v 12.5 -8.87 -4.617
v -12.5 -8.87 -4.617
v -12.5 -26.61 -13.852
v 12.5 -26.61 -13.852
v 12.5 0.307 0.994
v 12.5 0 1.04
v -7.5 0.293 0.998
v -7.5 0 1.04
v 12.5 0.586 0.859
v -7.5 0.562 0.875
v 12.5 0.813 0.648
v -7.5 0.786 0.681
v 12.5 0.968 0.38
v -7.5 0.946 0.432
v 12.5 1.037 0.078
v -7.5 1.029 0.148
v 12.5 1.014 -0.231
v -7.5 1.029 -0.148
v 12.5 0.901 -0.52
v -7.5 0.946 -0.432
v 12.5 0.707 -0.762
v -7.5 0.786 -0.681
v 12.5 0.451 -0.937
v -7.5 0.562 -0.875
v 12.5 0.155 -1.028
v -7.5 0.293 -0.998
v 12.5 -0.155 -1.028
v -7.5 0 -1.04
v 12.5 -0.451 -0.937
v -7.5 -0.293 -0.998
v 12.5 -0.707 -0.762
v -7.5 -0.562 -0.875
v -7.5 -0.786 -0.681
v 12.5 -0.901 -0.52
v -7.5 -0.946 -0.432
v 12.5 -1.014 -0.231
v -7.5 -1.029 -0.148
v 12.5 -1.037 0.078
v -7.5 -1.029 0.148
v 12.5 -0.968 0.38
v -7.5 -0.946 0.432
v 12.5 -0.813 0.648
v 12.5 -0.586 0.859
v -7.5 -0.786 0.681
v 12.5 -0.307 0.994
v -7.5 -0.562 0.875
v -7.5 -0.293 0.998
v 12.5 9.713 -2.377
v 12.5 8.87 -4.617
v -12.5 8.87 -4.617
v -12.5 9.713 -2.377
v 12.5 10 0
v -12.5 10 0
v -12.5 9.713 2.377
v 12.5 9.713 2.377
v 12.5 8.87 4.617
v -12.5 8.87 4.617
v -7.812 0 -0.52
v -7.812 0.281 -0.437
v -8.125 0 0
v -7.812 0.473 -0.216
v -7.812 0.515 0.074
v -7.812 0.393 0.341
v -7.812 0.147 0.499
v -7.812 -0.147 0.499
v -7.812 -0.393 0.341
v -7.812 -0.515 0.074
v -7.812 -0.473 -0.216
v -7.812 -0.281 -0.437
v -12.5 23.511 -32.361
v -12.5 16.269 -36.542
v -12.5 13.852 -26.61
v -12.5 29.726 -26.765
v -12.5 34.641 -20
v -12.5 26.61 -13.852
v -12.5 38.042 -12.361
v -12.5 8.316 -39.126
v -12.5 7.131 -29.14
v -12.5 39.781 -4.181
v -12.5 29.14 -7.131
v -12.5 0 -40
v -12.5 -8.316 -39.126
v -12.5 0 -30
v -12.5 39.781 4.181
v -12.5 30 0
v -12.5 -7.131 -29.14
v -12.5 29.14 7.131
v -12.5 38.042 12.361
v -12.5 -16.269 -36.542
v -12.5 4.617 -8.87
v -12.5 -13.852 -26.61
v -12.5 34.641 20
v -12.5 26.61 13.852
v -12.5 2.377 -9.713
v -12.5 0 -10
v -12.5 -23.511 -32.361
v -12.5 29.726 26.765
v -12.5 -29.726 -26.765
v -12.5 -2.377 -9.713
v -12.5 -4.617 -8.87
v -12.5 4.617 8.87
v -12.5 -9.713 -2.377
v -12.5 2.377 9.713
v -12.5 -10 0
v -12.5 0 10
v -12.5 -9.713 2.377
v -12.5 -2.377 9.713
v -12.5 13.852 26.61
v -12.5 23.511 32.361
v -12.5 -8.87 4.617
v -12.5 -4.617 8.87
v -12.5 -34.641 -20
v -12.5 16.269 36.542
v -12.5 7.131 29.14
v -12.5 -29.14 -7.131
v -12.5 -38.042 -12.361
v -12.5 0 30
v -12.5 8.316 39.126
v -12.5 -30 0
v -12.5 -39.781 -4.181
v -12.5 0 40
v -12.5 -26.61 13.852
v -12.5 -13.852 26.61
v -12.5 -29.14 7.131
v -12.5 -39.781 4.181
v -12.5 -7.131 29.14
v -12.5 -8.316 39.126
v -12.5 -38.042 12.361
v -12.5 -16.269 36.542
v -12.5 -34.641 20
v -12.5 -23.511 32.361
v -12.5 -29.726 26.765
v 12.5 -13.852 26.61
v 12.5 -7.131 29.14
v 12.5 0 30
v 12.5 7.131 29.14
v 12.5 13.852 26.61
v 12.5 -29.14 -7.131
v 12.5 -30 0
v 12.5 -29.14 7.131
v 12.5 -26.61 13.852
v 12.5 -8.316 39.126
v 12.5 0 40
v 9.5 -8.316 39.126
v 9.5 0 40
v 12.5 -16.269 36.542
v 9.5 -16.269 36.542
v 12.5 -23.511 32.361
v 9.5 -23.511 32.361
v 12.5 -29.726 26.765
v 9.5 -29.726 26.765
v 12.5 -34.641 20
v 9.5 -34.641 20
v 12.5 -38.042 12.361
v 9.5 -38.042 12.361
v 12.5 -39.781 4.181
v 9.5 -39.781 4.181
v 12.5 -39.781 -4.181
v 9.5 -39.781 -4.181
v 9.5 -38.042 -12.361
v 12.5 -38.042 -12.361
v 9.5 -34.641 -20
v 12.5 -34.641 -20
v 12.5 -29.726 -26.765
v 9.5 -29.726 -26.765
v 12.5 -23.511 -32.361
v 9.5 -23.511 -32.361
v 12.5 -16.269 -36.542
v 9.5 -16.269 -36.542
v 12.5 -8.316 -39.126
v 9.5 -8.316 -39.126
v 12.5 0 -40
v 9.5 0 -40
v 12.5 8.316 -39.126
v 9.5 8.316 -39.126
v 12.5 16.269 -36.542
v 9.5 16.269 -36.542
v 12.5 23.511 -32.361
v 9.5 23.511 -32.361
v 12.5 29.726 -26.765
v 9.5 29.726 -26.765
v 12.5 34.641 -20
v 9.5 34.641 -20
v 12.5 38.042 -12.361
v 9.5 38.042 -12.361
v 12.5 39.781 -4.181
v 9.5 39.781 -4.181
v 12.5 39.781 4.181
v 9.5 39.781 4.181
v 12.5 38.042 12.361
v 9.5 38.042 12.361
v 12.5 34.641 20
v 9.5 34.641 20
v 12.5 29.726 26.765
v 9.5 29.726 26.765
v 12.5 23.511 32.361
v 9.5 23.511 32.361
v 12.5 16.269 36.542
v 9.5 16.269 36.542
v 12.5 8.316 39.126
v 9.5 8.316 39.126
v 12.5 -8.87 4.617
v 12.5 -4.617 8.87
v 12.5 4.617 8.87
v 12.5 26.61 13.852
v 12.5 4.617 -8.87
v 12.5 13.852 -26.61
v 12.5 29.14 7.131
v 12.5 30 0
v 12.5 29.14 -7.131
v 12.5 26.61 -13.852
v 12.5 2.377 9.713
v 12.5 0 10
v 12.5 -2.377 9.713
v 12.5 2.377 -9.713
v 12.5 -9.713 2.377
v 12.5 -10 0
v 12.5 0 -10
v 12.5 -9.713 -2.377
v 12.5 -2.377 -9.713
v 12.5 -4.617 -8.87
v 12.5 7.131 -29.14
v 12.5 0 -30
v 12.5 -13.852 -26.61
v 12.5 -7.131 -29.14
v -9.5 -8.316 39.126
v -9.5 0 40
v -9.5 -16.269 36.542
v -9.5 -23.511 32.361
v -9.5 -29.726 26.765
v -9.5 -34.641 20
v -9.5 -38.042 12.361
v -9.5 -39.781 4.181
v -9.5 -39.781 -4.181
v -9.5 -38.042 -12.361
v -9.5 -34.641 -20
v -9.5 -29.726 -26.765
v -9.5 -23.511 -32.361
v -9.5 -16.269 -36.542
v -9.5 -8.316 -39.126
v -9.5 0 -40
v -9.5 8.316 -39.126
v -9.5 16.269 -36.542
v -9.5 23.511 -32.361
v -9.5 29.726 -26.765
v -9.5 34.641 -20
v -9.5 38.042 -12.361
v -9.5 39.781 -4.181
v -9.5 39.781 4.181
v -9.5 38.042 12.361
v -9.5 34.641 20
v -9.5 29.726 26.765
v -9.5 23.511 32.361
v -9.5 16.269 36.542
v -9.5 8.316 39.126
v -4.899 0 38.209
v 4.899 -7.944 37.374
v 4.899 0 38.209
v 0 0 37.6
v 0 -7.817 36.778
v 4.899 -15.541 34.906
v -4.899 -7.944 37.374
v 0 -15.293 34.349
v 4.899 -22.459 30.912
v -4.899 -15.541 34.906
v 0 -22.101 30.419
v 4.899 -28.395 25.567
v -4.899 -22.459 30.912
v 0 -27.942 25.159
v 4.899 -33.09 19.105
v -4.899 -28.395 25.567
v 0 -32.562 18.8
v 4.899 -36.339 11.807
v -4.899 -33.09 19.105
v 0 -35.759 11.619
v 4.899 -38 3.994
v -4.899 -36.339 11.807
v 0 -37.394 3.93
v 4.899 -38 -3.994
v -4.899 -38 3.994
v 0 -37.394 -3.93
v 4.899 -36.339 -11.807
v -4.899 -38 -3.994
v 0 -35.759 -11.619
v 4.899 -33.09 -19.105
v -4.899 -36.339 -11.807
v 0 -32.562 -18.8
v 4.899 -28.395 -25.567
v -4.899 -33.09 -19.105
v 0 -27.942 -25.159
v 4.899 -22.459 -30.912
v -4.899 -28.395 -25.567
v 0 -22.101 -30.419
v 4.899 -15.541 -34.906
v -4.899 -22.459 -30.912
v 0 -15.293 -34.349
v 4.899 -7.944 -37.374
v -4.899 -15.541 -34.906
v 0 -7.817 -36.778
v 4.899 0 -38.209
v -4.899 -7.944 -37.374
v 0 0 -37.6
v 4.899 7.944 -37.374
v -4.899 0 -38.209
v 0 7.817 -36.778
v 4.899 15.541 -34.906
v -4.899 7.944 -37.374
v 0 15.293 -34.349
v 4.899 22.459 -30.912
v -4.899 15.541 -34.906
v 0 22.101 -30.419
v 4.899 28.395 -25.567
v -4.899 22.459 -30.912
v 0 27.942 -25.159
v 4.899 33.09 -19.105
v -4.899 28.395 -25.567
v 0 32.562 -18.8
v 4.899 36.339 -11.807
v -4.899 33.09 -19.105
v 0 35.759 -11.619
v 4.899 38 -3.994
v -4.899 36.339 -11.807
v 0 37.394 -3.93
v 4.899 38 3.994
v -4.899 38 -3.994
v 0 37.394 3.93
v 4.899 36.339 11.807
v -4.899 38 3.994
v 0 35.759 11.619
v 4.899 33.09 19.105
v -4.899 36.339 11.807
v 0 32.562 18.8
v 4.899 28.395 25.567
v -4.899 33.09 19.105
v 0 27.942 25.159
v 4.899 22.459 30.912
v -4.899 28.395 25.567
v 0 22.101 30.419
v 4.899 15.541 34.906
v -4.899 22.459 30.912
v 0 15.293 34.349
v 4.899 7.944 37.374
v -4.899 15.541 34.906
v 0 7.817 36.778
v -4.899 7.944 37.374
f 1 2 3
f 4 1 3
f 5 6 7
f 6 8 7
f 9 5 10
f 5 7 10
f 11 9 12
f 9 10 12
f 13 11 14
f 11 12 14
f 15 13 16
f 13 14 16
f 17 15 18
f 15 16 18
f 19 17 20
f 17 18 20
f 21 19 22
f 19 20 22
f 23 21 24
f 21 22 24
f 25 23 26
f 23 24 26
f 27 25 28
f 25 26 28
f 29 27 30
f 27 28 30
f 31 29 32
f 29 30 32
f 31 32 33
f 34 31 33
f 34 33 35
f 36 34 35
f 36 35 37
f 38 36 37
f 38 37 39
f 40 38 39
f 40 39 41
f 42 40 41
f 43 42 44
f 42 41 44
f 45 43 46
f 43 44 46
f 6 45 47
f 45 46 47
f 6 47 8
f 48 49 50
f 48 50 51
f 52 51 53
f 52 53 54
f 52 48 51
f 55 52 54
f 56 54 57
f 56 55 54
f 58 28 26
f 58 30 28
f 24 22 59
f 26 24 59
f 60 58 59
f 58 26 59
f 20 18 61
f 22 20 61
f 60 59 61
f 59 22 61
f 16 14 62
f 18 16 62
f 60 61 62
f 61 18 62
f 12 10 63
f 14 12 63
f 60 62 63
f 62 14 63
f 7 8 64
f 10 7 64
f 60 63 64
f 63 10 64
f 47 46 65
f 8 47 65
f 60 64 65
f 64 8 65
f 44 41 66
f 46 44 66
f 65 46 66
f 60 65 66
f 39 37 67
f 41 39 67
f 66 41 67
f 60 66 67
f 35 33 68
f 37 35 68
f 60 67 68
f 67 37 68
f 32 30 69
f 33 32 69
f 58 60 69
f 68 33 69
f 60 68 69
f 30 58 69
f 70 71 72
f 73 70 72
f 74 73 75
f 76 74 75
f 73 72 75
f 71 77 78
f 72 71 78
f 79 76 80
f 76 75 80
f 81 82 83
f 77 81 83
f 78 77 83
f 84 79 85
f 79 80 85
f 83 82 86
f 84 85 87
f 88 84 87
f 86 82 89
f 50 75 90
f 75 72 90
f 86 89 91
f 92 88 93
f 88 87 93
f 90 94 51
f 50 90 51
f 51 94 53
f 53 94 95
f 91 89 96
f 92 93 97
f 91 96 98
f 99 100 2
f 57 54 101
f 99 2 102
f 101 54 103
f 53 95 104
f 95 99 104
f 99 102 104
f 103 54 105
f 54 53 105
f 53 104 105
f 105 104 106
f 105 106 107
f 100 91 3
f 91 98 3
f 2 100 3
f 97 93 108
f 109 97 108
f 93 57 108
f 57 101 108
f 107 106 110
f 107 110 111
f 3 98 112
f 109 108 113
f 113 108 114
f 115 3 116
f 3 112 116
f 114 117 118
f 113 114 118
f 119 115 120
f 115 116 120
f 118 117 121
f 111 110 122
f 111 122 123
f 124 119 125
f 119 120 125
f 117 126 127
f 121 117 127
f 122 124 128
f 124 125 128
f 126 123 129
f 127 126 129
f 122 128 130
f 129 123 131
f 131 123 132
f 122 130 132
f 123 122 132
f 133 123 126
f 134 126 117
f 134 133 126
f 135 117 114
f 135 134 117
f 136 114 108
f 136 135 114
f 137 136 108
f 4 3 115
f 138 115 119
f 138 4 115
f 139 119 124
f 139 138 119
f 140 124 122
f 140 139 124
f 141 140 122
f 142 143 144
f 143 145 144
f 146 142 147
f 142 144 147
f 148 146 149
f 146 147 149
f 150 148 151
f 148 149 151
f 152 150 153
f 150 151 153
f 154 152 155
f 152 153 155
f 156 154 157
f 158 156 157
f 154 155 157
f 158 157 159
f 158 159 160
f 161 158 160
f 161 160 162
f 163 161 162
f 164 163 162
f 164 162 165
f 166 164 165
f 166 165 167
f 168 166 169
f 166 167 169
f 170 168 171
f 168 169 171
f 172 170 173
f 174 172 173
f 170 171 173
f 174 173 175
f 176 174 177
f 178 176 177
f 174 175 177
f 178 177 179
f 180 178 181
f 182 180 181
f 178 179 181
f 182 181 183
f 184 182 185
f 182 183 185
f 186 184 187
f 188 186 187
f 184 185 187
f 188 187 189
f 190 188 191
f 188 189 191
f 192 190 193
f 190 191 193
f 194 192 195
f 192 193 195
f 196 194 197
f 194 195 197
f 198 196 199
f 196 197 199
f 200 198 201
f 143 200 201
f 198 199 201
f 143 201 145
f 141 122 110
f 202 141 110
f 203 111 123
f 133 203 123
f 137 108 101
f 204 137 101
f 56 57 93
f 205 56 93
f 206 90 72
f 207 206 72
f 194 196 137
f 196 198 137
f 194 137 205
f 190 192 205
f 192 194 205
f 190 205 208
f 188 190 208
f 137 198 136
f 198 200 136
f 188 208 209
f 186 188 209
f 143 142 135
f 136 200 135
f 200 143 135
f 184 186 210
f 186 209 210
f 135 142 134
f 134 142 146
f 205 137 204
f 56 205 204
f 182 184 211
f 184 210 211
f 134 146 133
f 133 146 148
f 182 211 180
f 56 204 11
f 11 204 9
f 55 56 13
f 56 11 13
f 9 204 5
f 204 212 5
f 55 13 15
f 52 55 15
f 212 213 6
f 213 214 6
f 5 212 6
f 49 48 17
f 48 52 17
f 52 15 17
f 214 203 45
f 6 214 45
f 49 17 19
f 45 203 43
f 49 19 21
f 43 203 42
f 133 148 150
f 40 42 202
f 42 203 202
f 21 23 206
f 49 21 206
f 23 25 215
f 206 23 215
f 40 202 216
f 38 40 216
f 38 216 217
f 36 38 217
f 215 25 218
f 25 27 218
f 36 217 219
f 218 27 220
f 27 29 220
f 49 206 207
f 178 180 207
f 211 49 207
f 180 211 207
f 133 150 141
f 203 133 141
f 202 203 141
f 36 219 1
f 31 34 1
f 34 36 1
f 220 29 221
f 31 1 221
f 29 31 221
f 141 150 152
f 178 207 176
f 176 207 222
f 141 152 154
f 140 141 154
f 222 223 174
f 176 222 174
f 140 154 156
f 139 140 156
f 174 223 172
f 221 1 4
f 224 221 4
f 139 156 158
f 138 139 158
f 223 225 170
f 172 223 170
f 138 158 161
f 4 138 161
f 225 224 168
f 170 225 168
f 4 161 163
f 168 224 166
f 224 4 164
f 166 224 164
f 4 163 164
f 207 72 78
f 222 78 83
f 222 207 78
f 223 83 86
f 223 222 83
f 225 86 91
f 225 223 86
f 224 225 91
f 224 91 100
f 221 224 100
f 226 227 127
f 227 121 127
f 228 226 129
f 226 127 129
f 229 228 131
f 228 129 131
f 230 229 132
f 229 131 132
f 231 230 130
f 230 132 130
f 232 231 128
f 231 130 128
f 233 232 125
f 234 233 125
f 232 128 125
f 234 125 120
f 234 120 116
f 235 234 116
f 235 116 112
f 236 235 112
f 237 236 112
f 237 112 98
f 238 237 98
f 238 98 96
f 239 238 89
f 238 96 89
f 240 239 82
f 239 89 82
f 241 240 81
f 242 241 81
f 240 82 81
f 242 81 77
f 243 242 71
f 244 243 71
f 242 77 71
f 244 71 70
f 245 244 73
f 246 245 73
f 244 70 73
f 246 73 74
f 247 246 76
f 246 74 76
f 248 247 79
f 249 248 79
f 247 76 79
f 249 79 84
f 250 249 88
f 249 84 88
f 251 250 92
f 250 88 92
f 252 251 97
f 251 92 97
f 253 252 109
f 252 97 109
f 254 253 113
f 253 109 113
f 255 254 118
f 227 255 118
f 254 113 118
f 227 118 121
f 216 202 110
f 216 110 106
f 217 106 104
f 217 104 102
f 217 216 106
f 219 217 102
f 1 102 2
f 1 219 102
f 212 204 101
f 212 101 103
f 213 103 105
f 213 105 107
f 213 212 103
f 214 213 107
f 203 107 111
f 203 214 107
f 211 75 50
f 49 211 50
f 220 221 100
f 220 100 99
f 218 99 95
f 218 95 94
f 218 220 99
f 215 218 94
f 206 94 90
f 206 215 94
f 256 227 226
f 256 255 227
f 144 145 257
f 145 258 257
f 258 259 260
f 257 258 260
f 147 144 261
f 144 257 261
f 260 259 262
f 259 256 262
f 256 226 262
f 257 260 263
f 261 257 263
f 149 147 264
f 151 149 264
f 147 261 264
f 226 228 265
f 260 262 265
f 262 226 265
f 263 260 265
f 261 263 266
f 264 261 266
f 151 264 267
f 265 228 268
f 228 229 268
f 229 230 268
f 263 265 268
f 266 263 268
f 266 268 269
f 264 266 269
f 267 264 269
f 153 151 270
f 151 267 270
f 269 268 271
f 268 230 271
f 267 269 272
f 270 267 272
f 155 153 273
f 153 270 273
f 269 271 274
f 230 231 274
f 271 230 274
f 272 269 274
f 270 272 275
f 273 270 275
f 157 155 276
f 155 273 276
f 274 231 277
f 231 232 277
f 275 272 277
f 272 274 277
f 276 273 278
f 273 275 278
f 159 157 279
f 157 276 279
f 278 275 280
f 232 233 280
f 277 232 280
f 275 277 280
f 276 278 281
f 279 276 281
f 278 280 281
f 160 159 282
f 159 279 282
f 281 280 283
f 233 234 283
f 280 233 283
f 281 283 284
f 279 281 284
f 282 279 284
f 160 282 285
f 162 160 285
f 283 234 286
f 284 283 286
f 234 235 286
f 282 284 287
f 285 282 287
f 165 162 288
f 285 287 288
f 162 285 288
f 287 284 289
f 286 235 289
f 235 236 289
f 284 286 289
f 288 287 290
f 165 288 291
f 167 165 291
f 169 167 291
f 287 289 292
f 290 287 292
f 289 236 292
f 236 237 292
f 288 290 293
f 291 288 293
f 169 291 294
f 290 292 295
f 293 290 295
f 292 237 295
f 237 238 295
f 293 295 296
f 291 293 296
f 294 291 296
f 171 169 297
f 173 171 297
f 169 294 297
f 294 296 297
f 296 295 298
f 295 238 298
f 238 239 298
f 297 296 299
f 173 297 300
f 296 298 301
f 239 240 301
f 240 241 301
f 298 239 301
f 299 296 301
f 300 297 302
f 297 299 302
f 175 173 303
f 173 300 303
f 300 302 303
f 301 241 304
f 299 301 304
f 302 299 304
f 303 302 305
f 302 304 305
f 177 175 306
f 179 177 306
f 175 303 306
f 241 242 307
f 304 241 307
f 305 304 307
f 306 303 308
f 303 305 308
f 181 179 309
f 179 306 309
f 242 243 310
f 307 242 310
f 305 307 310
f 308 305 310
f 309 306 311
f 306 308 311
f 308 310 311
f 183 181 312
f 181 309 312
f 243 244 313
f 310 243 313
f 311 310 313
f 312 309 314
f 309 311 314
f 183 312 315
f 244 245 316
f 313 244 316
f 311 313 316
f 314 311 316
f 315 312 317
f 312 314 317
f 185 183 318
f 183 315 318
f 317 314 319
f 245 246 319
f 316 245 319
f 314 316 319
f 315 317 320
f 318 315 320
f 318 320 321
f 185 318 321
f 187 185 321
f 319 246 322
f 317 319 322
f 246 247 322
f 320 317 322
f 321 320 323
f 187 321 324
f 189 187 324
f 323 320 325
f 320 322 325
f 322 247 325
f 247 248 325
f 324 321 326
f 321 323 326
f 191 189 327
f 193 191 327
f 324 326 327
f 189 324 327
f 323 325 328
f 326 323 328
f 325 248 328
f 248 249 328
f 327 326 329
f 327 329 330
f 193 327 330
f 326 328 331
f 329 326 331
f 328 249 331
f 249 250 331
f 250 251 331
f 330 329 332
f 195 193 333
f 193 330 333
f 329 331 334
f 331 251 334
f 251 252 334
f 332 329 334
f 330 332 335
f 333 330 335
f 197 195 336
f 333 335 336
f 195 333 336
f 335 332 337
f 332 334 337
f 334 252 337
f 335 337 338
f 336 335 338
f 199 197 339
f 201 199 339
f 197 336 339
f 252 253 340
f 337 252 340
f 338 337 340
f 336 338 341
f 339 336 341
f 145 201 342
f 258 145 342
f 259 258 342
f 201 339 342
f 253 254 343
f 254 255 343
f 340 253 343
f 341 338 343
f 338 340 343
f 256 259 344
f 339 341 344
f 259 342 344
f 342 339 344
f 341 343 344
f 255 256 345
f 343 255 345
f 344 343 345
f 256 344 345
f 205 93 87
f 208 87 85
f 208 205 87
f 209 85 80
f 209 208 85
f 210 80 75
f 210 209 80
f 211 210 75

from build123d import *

# Parameters (mm, degrees)
CUT_EXTRUDE1_DEPTH               = 62.846584384
F_2_05_2_08_DIAMETER_HOLE1_D     = 2.08
F_2_05_2_08_DIAMETER_HOLE1_DEPTH = 20
F_2_05_2_08_DIAMETER_HOLE1_TIP   = 0.624895044


with BuildPart() as part:
    # Sketch1 → Revolve1 (revolve)
    with BuildSketch(Plane(origin=(0, 0, 0), x_dir=(1, 0, 0), z_dir=(0, 1, 0)), mode=Mode.PRIVATE) as revolve1_sk:
        with BuildLine():
            Line((-12.5, 0), (12.5, 0))
            Line((12.5, 0), (12.5, 40))
            Line((12.5, 40), (9.5, 40))
            ThreePointArc((9.5, 40), (0, 37.599715907), (-9.5, 40))
            Line((-9.5, 40), (-12.5, 40))
            Line((-12.5, 40), (-12.5, 0))
        make_face()
    revolve(revolve1_sk.sketch.rotate(Axis((-12.5, 0, 0), (1, 0, 0)), 180), axis=Axis((-12.5, 0, 0), (1, 0, 0)))

    # Sketch2 → Cut-Extrude1 (cut, through all)
    with BuildSketch(Plane(origin=(12.5, 0, 0), x_dir=(0, 0, -1), z_dir=(1, 0, 0))):
        with BuildLine():
            Line((-4.617486132, 8.870108332), (-13.852458397, 26.610324995))
            ThreePointArc((-13.852458397, 26.610324995), (0, 30), (13.852458397, 26.610324995))
            Line((13.852458397, 26.610324995), (4.617486132, 8.870108332))
            ThreePointArc((4.617486132, 8.870108332), (0, 10), (-4.617486132, 8.870108332))
        make_face()
        with BuildLine():
            Line((26.610324995, -13.852458397), (8.870108332, -4.617486132))
            ThreePointArc((8.870108332, -4.617486132), (10, 0), (8.870108332, 4.617486132))
            Line((8.870108332, 4.617486132), (26.610324995, 13.852458397))
            ThreePointArc((26.610324995, 13.852458397), (30, 0), (26.610324995, -13.852458397))
        make_face()
        with BuildLine():
            Line((-13.852458397, -26.610324995), (-4.617486132, -8.870108332))
            ThreePointArc((-4.617486132, -8.870108332), (0, -10), (4.617486132, -8.870108332))
            Line((4.617486132, -8.870108332), (13.852458397, -26.610324995))
            ThreePointArc((13.852458397, -26.610324995), (0, -30), (-13.852458397, -26.610324995))
        make_face()
        with BuildLine():
            Line((-26.610324995, 13.852458397), (-8.870108332, 4.617486132))
            ThreePointArc((-8.870108332, 4.617486132), (-10, 0), (-8.870108332, -4.617486132))
            Line((-8.870108332, -4.617486132), (-26.610324995, -13.852458397))
            ThreePointArc((-26.610324995, -13.852458397), (-30, 0), (-26.610324995, 13.852458397))
        make_face()
    extrude(amount=-CUT_EXTRUDE1_DEPTH, mode=Mode.SUBTRACT)

    # Ø2.05 (2.08) Diameter Hole1
    with Locations(Plane(origin=(12.5, 0, 0), x_dir=(0, 0, -1), z_dir=(1, 0, 0))):
        with Locations((0, 0)):
            Hole(F_2_05_2_08_DIAMETER_HOLE1_D / 2, depth=F_2_05_2_08_DIAMETER_HOLE1_DEPTH)
            with Locations((0, 0, -(F_2_05_2_08_DIAMETER_HOLE1_DEPTH + F_2_05_2_08_DIAMETER_HOLE1_TIP / 2))):  # 118° drill point
                Cone(0, F_2_05_2_08_DIAMETER_HOLE1_D / 2, F_2_05_2_08_DIAMETER_HOLE1_TIP, mode=Mode.SUBTRACT)


solid = part.part
